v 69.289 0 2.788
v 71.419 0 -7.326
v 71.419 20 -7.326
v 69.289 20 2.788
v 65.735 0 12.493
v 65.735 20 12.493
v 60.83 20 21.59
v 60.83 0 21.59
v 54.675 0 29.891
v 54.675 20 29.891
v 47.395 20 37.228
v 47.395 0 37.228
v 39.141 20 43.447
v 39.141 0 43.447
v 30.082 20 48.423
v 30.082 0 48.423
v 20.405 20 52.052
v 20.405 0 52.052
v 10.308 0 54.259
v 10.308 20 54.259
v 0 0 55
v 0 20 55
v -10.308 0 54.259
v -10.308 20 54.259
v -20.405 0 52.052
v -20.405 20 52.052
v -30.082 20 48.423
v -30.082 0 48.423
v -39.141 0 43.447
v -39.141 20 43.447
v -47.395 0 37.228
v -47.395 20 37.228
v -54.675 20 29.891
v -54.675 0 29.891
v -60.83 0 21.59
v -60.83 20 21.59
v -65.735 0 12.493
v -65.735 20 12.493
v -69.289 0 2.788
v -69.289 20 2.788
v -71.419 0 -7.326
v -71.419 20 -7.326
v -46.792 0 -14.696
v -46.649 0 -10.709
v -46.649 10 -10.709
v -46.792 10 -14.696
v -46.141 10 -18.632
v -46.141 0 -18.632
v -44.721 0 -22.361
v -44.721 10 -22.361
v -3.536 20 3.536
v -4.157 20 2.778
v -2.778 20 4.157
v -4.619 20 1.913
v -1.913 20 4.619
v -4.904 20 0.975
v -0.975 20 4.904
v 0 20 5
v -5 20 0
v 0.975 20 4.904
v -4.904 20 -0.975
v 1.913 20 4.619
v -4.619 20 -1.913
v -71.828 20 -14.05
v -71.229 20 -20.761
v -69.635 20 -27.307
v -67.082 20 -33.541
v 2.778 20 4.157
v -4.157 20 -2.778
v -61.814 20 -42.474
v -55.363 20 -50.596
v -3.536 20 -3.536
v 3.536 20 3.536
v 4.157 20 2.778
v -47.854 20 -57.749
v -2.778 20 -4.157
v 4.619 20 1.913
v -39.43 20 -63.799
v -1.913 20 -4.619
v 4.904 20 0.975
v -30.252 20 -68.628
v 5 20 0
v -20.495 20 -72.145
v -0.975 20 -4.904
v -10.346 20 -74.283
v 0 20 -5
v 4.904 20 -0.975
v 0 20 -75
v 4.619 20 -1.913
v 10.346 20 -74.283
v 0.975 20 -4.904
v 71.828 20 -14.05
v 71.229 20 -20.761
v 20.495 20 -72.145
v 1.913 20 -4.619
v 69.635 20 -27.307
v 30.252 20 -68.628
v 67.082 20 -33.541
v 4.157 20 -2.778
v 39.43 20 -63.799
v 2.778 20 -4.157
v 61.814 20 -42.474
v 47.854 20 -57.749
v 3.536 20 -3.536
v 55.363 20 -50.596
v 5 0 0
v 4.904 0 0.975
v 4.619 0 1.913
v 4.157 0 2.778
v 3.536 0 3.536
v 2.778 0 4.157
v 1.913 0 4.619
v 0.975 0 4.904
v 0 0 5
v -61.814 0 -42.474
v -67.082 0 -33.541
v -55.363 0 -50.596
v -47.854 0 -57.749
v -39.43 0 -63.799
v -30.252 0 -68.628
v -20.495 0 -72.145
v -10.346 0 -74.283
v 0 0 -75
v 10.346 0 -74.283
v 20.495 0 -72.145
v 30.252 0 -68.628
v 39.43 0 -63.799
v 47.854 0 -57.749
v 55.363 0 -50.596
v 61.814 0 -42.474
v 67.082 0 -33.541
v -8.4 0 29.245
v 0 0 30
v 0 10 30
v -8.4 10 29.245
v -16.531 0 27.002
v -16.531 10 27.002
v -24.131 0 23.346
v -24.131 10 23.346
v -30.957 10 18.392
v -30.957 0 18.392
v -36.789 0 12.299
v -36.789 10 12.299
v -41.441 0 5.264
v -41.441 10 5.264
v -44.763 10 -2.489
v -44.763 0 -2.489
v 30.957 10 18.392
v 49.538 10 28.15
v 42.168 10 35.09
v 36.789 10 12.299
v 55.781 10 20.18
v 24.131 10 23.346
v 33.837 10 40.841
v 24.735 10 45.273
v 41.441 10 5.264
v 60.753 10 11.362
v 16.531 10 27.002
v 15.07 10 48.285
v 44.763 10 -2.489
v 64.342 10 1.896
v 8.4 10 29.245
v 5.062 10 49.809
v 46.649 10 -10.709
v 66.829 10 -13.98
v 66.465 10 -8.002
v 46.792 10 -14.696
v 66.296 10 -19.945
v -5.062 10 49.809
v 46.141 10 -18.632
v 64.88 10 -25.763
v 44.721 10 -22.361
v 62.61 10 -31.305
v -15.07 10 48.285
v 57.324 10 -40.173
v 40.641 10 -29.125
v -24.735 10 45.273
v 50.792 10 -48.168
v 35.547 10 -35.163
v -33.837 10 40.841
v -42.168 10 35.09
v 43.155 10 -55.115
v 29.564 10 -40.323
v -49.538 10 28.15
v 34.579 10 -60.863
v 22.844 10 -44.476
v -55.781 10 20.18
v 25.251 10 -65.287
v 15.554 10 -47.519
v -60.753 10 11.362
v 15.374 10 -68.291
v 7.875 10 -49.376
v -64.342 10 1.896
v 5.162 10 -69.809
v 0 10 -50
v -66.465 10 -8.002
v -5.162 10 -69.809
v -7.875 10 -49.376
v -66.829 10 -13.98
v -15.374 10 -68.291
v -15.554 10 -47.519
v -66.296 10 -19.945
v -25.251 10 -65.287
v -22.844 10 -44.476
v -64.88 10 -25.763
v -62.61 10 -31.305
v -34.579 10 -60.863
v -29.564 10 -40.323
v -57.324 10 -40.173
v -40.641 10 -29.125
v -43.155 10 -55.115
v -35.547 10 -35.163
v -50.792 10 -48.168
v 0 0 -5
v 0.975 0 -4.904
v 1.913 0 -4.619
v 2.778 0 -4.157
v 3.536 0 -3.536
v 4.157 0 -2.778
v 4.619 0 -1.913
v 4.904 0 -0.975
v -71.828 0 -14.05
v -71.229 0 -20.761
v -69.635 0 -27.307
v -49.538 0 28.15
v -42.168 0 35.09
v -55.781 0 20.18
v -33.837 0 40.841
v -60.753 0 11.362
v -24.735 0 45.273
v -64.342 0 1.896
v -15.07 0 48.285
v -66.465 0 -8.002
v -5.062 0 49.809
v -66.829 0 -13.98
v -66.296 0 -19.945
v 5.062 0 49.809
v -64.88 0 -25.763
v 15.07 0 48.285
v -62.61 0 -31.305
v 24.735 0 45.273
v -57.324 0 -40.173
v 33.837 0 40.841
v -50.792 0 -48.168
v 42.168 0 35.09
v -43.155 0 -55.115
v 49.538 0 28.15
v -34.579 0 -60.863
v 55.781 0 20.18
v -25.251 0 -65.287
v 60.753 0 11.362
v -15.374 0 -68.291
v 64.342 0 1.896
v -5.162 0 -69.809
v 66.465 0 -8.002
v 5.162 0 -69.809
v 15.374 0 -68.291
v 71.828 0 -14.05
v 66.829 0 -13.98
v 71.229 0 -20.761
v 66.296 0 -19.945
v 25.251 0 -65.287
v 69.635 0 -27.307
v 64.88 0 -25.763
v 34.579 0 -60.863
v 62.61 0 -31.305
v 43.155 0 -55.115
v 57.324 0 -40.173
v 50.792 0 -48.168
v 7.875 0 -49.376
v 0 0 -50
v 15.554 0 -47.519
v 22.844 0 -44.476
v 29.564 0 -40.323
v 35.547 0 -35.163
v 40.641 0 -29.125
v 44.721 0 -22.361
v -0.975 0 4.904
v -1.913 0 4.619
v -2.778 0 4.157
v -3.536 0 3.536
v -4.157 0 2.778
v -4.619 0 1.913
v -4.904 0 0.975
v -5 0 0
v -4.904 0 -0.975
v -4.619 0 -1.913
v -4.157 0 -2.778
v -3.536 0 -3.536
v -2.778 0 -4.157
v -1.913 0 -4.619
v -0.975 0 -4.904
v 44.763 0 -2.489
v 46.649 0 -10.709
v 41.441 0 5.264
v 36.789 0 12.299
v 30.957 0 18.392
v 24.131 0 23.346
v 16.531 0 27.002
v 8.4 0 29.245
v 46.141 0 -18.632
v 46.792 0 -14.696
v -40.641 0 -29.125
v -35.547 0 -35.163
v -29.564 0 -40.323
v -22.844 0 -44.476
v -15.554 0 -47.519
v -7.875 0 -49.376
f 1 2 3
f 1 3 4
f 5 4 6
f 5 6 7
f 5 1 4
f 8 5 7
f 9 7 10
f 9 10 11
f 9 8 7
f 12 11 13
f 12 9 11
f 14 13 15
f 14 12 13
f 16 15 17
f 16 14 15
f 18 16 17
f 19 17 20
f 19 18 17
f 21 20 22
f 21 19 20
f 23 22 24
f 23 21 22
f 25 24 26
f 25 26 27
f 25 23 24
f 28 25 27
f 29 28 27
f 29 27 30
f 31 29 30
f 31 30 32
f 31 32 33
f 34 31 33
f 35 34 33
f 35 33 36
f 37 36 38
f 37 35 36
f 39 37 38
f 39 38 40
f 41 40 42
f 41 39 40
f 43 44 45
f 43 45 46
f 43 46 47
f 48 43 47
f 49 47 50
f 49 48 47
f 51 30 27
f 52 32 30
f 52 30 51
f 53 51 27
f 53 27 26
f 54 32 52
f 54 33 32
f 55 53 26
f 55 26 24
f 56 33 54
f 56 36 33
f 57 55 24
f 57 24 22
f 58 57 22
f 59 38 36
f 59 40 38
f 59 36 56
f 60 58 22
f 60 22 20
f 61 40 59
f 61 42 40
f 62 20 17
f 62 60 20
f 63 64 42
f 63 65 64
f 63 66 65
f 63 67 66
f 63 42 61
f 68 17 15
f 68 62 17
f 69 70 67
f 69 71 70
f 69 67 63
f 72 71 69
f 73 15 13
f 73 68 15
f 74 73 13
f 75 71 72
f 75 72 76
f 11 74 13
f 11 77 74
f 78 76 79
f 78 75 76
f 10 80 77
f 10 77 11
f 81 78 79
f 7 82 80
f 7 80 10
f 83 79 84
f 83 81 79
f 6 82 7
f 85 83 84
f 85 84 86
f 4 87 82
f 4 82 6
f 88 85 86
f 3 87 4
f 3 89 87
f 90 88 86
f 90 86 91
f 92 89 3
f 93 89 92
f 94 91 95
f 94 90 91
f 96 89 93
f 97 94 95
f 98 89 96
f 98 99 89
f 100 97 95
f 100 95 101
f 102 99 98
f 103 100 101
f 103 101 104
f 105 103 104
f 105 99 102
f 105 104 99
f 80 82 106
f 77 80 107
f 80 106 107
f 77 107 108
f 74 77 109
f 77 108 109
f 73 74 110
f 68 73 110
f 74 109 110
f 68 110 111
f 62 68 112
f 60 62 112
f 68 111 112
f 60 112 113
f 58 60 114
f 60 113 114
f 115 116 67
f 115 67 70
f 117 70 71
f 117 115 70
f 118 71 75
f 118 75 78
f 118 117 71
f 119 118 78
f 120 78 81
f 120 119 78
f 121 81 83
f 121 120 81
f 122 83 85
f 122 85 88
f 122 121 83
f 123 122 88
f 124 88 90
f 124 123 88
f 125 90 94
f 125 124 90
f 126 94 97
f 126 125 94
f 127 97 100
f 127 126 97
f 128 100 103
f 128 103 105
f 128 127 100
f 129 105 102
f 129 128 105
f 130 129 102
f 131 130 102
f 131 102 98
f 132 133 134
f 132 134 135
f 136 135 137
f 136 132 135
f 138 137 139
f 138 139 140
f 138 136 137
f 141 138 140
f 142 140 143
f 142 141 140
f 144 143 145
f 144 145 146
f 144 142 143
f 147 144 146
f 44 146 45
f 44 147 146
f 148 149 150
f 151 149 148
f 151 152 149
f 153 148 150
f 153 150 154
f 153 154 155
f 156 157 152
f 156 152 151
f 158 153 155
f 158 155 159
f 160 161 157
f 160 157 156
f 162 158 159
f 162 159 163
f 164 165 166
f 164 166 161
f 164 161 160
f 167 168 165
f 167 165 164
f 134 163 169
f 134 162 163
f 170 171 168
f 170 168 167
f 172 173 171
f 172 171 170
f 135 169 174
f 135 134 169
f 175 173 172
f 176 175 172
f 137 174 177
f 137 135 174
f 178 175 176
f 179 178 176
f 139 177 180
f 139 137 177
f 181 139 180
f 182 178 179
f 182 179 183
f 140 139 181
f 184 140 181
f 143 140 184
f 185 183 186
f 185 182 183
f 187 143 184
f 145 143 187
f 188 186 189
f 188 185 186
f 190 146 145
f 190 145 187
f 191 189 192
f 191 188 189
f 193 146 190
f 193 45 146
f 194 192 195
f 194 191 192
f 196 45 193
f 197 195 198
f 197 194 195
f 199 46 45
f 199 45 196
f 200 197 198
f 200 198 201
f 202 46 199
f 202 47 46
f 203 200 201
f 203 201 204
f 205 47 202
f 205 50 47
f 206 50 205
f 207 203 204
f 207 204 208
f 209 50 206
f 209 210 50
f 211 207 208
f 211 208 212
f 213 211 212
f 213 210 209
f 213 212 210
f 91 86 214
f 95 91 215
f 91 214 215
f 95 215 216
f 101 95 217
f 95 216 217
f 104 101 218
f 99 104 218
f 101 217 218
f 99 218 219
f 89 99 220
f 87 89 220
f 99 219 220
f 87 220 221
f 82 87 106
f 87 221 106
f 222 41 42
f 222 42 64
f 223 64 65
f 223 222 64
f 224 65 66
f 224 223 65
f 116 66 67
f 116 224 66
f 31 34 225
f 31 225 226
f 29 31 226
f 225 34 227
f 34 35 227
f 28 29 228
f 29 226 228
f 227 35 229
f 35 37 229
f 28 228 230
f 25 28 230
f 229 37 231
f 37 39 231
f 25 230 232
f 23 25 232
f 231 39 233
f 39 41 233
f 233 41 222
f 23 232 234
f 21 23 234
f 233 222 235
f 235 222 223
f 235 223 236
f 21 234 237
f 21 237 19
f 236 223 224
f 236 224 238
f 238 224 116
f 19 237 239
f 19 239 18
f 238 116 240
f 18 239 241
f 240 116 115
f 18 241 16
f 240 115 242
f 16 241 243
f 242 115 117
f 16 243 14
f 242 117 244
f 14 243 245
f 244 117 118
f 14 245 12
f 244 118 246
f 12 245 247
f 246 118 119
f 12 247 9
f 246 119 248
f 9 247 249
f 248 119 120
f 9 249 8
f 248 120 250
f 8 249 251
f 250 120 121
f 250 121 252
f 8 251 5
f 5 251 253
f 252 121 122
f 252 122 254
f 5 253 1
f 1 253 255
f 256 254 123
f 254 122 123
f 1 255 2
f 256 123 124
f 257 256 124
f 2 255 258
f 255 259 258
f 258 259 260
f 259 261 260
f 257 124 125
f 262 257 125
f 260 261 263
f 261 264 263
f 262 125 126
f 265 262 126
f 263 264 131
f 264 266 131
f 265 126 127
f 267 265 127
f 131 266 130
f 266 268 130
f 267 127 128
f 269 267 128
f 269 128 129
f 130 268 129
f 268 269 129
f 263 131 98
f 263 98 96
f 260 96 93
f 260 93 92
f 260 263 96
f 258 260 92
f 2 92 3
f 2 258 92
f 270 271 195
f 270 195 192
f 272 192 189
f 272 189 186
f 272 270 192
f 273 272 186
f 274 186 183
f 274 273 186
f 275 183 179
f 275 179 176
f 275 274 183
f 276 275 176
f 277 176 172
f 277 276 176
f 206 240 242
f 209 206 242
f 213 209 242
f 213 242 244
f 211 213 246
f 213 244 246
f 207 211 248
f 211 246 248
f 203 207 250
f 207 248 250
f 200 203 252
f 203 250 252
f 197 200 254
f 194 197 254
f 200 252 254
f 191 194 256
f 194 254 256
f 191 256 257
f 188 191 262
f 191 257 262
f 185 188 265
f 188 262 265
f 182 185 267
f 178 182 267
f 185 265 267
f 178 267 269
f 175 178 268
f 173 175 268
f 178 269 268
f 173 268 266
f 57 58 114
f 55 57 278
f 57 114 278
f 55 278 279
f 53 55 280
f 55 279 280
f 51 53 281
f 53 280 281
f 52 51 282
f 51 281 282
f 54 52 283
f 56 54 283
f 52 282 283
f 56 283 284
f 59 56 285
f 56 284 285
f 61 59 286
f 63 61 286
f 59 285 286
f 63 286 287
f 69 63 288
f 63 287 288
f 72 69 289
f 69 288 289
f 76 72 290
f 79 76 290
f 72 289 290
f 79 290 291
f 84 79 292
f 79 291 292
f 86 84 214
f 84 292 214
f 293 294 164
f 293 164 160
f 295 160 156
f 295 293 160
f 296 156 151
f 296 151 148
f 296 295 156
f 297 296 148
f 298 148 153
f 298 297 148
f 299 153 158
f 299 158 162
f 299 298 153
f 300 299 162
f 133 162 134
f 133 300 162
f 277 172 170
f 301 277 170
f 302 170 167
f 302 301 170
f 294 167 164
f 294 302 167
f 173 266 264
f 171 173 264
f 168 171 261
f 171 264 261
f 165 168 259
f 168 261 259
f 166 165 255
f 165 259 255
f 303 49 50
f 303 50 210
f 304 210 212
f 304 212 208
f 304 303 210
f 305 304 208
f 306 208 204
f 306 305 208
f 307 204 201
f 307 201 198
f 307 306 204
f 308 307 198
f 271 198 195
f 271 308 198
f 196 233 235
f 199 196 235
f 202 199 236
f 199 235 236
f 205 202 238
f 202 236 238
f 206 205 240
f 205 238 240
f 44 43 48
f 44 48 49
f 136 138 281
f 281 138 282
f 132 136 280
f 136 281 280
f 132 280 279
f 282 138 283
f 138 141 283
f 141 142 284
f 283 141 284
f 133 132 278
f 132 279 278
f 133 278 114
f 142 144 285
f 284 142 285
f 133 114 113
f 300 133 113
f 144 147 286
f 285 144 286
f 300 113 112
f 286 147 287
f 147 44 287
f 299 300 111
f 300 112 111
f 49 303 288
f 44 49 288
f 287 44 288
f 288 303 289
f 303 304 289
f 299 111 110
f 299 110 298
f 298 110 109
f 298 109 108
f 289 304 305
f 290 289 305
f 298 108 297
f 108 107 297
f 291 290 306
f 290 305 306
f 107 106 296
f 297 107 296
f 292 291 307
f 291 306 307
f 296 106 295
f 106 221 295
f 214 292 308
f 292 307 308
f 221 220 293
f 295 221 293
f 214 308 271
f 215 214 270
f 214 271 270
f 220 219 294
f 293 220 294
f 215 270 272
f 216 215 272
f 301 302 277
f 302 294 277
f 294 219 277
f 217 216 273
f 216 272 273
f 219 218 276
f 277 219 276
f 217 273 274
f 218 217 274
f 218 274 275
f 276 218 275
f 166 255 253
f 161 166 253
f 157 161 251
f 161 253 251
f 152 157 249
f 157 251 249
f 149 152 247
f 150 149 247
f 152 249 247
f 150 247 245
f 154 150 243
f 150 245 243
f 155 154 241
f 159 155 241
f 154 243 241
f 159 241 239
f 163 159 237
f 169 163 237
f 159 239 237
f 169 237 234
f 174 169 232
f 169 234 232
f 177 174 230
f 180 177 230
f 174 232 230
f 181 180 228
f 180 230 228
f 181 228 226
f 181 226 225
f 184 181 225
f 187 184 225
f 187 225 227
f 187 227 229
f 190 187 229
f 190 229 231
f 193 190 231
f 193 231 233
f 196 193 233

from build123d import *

# Parameters (mm, degrees)
SKETCH_1_R          = 5
EXTRUDE_3_DEPTH     = 20
CUT_EXTRUDE_2_DEPTH = 10


with BuildPart() as part:
    # 草图1 → 凸台-拉伸3 (new body)
    with BuildSketch(Plane(origin=(0, 0, 0), x_dir=(1, 0, 0), z_dir=(0, 1, 0))):
        with BuildLine():
            ThreePointArc((71.418701356, 7.325529194), (71.229458894, 20.760662474), (67.082039325, 33.541019662))
            ThreePointArc((67.082039325, 33.541019662), (0, 75), (-67.082039325, 33.541019662))
            ThreePointArc((-67.082039325, 33.541019662), (-71.229458894, 20.760662474), (-71.418701356, 7.325529194))
            ThreePointArc((-71.418701356, 7.325529194), (0, -55), (71.418701356, 7.325529194))
        make_face()
        Circle(SKETCH_1_R, mode=Mode.SUBTRACT)
    extrude(amount=EXTRUDE_3_DEPTH)

    # 草图1<4> → 切除-拉伸2 (cut)
    with BuildSketch(Plane(origin=(0, 0, 0), x_dir=(1, 0, 0), z_dir=(0, 1, 0))):
        with BuildLine():
            ThreePointArc((66.464714064, 8.002293491), (66.296498543, 19.944634184), (62.60990337, 31.304951685))
            ThreePointArc((62.60990337, 31.304951685), (0, 70), (-62.60990337, 31.304951685))
            ThreePointArc((-62.60990337, 31.304951685), (-66.296498543, 19.944634184), (-66.464714064, 8.002293491))
            ThreePointArc((-66.464714064, 8.002293491), (0, -50), (66.464714064, 8.002293491))
        make_face()
        with BuildLine():
            ThreePointArc((46.648764897, 10.709350678), (0, -30), (-46.648764897, 10.709350678))
            ThreePointArc((-46.648764897, 10.709350678), (-46.564657136, 16.680521024), (-44.72135955, 22.360679775))
            ThreePointArc((-44.72135955, 22.360679775), (0, 50), (44.72135955, 22.360679775))
            ThreePointArc((44.72135955, 22.360679775), (46.564657136, 16.680521024), (46.648764897, 10.709350678))
        make_face(mode=Mode.SUBTRACT)
    extrude(amount=CUT_EXTRUDE_2_DEPTH, mode=Mode.SUBTRACT)


solid = part.part
